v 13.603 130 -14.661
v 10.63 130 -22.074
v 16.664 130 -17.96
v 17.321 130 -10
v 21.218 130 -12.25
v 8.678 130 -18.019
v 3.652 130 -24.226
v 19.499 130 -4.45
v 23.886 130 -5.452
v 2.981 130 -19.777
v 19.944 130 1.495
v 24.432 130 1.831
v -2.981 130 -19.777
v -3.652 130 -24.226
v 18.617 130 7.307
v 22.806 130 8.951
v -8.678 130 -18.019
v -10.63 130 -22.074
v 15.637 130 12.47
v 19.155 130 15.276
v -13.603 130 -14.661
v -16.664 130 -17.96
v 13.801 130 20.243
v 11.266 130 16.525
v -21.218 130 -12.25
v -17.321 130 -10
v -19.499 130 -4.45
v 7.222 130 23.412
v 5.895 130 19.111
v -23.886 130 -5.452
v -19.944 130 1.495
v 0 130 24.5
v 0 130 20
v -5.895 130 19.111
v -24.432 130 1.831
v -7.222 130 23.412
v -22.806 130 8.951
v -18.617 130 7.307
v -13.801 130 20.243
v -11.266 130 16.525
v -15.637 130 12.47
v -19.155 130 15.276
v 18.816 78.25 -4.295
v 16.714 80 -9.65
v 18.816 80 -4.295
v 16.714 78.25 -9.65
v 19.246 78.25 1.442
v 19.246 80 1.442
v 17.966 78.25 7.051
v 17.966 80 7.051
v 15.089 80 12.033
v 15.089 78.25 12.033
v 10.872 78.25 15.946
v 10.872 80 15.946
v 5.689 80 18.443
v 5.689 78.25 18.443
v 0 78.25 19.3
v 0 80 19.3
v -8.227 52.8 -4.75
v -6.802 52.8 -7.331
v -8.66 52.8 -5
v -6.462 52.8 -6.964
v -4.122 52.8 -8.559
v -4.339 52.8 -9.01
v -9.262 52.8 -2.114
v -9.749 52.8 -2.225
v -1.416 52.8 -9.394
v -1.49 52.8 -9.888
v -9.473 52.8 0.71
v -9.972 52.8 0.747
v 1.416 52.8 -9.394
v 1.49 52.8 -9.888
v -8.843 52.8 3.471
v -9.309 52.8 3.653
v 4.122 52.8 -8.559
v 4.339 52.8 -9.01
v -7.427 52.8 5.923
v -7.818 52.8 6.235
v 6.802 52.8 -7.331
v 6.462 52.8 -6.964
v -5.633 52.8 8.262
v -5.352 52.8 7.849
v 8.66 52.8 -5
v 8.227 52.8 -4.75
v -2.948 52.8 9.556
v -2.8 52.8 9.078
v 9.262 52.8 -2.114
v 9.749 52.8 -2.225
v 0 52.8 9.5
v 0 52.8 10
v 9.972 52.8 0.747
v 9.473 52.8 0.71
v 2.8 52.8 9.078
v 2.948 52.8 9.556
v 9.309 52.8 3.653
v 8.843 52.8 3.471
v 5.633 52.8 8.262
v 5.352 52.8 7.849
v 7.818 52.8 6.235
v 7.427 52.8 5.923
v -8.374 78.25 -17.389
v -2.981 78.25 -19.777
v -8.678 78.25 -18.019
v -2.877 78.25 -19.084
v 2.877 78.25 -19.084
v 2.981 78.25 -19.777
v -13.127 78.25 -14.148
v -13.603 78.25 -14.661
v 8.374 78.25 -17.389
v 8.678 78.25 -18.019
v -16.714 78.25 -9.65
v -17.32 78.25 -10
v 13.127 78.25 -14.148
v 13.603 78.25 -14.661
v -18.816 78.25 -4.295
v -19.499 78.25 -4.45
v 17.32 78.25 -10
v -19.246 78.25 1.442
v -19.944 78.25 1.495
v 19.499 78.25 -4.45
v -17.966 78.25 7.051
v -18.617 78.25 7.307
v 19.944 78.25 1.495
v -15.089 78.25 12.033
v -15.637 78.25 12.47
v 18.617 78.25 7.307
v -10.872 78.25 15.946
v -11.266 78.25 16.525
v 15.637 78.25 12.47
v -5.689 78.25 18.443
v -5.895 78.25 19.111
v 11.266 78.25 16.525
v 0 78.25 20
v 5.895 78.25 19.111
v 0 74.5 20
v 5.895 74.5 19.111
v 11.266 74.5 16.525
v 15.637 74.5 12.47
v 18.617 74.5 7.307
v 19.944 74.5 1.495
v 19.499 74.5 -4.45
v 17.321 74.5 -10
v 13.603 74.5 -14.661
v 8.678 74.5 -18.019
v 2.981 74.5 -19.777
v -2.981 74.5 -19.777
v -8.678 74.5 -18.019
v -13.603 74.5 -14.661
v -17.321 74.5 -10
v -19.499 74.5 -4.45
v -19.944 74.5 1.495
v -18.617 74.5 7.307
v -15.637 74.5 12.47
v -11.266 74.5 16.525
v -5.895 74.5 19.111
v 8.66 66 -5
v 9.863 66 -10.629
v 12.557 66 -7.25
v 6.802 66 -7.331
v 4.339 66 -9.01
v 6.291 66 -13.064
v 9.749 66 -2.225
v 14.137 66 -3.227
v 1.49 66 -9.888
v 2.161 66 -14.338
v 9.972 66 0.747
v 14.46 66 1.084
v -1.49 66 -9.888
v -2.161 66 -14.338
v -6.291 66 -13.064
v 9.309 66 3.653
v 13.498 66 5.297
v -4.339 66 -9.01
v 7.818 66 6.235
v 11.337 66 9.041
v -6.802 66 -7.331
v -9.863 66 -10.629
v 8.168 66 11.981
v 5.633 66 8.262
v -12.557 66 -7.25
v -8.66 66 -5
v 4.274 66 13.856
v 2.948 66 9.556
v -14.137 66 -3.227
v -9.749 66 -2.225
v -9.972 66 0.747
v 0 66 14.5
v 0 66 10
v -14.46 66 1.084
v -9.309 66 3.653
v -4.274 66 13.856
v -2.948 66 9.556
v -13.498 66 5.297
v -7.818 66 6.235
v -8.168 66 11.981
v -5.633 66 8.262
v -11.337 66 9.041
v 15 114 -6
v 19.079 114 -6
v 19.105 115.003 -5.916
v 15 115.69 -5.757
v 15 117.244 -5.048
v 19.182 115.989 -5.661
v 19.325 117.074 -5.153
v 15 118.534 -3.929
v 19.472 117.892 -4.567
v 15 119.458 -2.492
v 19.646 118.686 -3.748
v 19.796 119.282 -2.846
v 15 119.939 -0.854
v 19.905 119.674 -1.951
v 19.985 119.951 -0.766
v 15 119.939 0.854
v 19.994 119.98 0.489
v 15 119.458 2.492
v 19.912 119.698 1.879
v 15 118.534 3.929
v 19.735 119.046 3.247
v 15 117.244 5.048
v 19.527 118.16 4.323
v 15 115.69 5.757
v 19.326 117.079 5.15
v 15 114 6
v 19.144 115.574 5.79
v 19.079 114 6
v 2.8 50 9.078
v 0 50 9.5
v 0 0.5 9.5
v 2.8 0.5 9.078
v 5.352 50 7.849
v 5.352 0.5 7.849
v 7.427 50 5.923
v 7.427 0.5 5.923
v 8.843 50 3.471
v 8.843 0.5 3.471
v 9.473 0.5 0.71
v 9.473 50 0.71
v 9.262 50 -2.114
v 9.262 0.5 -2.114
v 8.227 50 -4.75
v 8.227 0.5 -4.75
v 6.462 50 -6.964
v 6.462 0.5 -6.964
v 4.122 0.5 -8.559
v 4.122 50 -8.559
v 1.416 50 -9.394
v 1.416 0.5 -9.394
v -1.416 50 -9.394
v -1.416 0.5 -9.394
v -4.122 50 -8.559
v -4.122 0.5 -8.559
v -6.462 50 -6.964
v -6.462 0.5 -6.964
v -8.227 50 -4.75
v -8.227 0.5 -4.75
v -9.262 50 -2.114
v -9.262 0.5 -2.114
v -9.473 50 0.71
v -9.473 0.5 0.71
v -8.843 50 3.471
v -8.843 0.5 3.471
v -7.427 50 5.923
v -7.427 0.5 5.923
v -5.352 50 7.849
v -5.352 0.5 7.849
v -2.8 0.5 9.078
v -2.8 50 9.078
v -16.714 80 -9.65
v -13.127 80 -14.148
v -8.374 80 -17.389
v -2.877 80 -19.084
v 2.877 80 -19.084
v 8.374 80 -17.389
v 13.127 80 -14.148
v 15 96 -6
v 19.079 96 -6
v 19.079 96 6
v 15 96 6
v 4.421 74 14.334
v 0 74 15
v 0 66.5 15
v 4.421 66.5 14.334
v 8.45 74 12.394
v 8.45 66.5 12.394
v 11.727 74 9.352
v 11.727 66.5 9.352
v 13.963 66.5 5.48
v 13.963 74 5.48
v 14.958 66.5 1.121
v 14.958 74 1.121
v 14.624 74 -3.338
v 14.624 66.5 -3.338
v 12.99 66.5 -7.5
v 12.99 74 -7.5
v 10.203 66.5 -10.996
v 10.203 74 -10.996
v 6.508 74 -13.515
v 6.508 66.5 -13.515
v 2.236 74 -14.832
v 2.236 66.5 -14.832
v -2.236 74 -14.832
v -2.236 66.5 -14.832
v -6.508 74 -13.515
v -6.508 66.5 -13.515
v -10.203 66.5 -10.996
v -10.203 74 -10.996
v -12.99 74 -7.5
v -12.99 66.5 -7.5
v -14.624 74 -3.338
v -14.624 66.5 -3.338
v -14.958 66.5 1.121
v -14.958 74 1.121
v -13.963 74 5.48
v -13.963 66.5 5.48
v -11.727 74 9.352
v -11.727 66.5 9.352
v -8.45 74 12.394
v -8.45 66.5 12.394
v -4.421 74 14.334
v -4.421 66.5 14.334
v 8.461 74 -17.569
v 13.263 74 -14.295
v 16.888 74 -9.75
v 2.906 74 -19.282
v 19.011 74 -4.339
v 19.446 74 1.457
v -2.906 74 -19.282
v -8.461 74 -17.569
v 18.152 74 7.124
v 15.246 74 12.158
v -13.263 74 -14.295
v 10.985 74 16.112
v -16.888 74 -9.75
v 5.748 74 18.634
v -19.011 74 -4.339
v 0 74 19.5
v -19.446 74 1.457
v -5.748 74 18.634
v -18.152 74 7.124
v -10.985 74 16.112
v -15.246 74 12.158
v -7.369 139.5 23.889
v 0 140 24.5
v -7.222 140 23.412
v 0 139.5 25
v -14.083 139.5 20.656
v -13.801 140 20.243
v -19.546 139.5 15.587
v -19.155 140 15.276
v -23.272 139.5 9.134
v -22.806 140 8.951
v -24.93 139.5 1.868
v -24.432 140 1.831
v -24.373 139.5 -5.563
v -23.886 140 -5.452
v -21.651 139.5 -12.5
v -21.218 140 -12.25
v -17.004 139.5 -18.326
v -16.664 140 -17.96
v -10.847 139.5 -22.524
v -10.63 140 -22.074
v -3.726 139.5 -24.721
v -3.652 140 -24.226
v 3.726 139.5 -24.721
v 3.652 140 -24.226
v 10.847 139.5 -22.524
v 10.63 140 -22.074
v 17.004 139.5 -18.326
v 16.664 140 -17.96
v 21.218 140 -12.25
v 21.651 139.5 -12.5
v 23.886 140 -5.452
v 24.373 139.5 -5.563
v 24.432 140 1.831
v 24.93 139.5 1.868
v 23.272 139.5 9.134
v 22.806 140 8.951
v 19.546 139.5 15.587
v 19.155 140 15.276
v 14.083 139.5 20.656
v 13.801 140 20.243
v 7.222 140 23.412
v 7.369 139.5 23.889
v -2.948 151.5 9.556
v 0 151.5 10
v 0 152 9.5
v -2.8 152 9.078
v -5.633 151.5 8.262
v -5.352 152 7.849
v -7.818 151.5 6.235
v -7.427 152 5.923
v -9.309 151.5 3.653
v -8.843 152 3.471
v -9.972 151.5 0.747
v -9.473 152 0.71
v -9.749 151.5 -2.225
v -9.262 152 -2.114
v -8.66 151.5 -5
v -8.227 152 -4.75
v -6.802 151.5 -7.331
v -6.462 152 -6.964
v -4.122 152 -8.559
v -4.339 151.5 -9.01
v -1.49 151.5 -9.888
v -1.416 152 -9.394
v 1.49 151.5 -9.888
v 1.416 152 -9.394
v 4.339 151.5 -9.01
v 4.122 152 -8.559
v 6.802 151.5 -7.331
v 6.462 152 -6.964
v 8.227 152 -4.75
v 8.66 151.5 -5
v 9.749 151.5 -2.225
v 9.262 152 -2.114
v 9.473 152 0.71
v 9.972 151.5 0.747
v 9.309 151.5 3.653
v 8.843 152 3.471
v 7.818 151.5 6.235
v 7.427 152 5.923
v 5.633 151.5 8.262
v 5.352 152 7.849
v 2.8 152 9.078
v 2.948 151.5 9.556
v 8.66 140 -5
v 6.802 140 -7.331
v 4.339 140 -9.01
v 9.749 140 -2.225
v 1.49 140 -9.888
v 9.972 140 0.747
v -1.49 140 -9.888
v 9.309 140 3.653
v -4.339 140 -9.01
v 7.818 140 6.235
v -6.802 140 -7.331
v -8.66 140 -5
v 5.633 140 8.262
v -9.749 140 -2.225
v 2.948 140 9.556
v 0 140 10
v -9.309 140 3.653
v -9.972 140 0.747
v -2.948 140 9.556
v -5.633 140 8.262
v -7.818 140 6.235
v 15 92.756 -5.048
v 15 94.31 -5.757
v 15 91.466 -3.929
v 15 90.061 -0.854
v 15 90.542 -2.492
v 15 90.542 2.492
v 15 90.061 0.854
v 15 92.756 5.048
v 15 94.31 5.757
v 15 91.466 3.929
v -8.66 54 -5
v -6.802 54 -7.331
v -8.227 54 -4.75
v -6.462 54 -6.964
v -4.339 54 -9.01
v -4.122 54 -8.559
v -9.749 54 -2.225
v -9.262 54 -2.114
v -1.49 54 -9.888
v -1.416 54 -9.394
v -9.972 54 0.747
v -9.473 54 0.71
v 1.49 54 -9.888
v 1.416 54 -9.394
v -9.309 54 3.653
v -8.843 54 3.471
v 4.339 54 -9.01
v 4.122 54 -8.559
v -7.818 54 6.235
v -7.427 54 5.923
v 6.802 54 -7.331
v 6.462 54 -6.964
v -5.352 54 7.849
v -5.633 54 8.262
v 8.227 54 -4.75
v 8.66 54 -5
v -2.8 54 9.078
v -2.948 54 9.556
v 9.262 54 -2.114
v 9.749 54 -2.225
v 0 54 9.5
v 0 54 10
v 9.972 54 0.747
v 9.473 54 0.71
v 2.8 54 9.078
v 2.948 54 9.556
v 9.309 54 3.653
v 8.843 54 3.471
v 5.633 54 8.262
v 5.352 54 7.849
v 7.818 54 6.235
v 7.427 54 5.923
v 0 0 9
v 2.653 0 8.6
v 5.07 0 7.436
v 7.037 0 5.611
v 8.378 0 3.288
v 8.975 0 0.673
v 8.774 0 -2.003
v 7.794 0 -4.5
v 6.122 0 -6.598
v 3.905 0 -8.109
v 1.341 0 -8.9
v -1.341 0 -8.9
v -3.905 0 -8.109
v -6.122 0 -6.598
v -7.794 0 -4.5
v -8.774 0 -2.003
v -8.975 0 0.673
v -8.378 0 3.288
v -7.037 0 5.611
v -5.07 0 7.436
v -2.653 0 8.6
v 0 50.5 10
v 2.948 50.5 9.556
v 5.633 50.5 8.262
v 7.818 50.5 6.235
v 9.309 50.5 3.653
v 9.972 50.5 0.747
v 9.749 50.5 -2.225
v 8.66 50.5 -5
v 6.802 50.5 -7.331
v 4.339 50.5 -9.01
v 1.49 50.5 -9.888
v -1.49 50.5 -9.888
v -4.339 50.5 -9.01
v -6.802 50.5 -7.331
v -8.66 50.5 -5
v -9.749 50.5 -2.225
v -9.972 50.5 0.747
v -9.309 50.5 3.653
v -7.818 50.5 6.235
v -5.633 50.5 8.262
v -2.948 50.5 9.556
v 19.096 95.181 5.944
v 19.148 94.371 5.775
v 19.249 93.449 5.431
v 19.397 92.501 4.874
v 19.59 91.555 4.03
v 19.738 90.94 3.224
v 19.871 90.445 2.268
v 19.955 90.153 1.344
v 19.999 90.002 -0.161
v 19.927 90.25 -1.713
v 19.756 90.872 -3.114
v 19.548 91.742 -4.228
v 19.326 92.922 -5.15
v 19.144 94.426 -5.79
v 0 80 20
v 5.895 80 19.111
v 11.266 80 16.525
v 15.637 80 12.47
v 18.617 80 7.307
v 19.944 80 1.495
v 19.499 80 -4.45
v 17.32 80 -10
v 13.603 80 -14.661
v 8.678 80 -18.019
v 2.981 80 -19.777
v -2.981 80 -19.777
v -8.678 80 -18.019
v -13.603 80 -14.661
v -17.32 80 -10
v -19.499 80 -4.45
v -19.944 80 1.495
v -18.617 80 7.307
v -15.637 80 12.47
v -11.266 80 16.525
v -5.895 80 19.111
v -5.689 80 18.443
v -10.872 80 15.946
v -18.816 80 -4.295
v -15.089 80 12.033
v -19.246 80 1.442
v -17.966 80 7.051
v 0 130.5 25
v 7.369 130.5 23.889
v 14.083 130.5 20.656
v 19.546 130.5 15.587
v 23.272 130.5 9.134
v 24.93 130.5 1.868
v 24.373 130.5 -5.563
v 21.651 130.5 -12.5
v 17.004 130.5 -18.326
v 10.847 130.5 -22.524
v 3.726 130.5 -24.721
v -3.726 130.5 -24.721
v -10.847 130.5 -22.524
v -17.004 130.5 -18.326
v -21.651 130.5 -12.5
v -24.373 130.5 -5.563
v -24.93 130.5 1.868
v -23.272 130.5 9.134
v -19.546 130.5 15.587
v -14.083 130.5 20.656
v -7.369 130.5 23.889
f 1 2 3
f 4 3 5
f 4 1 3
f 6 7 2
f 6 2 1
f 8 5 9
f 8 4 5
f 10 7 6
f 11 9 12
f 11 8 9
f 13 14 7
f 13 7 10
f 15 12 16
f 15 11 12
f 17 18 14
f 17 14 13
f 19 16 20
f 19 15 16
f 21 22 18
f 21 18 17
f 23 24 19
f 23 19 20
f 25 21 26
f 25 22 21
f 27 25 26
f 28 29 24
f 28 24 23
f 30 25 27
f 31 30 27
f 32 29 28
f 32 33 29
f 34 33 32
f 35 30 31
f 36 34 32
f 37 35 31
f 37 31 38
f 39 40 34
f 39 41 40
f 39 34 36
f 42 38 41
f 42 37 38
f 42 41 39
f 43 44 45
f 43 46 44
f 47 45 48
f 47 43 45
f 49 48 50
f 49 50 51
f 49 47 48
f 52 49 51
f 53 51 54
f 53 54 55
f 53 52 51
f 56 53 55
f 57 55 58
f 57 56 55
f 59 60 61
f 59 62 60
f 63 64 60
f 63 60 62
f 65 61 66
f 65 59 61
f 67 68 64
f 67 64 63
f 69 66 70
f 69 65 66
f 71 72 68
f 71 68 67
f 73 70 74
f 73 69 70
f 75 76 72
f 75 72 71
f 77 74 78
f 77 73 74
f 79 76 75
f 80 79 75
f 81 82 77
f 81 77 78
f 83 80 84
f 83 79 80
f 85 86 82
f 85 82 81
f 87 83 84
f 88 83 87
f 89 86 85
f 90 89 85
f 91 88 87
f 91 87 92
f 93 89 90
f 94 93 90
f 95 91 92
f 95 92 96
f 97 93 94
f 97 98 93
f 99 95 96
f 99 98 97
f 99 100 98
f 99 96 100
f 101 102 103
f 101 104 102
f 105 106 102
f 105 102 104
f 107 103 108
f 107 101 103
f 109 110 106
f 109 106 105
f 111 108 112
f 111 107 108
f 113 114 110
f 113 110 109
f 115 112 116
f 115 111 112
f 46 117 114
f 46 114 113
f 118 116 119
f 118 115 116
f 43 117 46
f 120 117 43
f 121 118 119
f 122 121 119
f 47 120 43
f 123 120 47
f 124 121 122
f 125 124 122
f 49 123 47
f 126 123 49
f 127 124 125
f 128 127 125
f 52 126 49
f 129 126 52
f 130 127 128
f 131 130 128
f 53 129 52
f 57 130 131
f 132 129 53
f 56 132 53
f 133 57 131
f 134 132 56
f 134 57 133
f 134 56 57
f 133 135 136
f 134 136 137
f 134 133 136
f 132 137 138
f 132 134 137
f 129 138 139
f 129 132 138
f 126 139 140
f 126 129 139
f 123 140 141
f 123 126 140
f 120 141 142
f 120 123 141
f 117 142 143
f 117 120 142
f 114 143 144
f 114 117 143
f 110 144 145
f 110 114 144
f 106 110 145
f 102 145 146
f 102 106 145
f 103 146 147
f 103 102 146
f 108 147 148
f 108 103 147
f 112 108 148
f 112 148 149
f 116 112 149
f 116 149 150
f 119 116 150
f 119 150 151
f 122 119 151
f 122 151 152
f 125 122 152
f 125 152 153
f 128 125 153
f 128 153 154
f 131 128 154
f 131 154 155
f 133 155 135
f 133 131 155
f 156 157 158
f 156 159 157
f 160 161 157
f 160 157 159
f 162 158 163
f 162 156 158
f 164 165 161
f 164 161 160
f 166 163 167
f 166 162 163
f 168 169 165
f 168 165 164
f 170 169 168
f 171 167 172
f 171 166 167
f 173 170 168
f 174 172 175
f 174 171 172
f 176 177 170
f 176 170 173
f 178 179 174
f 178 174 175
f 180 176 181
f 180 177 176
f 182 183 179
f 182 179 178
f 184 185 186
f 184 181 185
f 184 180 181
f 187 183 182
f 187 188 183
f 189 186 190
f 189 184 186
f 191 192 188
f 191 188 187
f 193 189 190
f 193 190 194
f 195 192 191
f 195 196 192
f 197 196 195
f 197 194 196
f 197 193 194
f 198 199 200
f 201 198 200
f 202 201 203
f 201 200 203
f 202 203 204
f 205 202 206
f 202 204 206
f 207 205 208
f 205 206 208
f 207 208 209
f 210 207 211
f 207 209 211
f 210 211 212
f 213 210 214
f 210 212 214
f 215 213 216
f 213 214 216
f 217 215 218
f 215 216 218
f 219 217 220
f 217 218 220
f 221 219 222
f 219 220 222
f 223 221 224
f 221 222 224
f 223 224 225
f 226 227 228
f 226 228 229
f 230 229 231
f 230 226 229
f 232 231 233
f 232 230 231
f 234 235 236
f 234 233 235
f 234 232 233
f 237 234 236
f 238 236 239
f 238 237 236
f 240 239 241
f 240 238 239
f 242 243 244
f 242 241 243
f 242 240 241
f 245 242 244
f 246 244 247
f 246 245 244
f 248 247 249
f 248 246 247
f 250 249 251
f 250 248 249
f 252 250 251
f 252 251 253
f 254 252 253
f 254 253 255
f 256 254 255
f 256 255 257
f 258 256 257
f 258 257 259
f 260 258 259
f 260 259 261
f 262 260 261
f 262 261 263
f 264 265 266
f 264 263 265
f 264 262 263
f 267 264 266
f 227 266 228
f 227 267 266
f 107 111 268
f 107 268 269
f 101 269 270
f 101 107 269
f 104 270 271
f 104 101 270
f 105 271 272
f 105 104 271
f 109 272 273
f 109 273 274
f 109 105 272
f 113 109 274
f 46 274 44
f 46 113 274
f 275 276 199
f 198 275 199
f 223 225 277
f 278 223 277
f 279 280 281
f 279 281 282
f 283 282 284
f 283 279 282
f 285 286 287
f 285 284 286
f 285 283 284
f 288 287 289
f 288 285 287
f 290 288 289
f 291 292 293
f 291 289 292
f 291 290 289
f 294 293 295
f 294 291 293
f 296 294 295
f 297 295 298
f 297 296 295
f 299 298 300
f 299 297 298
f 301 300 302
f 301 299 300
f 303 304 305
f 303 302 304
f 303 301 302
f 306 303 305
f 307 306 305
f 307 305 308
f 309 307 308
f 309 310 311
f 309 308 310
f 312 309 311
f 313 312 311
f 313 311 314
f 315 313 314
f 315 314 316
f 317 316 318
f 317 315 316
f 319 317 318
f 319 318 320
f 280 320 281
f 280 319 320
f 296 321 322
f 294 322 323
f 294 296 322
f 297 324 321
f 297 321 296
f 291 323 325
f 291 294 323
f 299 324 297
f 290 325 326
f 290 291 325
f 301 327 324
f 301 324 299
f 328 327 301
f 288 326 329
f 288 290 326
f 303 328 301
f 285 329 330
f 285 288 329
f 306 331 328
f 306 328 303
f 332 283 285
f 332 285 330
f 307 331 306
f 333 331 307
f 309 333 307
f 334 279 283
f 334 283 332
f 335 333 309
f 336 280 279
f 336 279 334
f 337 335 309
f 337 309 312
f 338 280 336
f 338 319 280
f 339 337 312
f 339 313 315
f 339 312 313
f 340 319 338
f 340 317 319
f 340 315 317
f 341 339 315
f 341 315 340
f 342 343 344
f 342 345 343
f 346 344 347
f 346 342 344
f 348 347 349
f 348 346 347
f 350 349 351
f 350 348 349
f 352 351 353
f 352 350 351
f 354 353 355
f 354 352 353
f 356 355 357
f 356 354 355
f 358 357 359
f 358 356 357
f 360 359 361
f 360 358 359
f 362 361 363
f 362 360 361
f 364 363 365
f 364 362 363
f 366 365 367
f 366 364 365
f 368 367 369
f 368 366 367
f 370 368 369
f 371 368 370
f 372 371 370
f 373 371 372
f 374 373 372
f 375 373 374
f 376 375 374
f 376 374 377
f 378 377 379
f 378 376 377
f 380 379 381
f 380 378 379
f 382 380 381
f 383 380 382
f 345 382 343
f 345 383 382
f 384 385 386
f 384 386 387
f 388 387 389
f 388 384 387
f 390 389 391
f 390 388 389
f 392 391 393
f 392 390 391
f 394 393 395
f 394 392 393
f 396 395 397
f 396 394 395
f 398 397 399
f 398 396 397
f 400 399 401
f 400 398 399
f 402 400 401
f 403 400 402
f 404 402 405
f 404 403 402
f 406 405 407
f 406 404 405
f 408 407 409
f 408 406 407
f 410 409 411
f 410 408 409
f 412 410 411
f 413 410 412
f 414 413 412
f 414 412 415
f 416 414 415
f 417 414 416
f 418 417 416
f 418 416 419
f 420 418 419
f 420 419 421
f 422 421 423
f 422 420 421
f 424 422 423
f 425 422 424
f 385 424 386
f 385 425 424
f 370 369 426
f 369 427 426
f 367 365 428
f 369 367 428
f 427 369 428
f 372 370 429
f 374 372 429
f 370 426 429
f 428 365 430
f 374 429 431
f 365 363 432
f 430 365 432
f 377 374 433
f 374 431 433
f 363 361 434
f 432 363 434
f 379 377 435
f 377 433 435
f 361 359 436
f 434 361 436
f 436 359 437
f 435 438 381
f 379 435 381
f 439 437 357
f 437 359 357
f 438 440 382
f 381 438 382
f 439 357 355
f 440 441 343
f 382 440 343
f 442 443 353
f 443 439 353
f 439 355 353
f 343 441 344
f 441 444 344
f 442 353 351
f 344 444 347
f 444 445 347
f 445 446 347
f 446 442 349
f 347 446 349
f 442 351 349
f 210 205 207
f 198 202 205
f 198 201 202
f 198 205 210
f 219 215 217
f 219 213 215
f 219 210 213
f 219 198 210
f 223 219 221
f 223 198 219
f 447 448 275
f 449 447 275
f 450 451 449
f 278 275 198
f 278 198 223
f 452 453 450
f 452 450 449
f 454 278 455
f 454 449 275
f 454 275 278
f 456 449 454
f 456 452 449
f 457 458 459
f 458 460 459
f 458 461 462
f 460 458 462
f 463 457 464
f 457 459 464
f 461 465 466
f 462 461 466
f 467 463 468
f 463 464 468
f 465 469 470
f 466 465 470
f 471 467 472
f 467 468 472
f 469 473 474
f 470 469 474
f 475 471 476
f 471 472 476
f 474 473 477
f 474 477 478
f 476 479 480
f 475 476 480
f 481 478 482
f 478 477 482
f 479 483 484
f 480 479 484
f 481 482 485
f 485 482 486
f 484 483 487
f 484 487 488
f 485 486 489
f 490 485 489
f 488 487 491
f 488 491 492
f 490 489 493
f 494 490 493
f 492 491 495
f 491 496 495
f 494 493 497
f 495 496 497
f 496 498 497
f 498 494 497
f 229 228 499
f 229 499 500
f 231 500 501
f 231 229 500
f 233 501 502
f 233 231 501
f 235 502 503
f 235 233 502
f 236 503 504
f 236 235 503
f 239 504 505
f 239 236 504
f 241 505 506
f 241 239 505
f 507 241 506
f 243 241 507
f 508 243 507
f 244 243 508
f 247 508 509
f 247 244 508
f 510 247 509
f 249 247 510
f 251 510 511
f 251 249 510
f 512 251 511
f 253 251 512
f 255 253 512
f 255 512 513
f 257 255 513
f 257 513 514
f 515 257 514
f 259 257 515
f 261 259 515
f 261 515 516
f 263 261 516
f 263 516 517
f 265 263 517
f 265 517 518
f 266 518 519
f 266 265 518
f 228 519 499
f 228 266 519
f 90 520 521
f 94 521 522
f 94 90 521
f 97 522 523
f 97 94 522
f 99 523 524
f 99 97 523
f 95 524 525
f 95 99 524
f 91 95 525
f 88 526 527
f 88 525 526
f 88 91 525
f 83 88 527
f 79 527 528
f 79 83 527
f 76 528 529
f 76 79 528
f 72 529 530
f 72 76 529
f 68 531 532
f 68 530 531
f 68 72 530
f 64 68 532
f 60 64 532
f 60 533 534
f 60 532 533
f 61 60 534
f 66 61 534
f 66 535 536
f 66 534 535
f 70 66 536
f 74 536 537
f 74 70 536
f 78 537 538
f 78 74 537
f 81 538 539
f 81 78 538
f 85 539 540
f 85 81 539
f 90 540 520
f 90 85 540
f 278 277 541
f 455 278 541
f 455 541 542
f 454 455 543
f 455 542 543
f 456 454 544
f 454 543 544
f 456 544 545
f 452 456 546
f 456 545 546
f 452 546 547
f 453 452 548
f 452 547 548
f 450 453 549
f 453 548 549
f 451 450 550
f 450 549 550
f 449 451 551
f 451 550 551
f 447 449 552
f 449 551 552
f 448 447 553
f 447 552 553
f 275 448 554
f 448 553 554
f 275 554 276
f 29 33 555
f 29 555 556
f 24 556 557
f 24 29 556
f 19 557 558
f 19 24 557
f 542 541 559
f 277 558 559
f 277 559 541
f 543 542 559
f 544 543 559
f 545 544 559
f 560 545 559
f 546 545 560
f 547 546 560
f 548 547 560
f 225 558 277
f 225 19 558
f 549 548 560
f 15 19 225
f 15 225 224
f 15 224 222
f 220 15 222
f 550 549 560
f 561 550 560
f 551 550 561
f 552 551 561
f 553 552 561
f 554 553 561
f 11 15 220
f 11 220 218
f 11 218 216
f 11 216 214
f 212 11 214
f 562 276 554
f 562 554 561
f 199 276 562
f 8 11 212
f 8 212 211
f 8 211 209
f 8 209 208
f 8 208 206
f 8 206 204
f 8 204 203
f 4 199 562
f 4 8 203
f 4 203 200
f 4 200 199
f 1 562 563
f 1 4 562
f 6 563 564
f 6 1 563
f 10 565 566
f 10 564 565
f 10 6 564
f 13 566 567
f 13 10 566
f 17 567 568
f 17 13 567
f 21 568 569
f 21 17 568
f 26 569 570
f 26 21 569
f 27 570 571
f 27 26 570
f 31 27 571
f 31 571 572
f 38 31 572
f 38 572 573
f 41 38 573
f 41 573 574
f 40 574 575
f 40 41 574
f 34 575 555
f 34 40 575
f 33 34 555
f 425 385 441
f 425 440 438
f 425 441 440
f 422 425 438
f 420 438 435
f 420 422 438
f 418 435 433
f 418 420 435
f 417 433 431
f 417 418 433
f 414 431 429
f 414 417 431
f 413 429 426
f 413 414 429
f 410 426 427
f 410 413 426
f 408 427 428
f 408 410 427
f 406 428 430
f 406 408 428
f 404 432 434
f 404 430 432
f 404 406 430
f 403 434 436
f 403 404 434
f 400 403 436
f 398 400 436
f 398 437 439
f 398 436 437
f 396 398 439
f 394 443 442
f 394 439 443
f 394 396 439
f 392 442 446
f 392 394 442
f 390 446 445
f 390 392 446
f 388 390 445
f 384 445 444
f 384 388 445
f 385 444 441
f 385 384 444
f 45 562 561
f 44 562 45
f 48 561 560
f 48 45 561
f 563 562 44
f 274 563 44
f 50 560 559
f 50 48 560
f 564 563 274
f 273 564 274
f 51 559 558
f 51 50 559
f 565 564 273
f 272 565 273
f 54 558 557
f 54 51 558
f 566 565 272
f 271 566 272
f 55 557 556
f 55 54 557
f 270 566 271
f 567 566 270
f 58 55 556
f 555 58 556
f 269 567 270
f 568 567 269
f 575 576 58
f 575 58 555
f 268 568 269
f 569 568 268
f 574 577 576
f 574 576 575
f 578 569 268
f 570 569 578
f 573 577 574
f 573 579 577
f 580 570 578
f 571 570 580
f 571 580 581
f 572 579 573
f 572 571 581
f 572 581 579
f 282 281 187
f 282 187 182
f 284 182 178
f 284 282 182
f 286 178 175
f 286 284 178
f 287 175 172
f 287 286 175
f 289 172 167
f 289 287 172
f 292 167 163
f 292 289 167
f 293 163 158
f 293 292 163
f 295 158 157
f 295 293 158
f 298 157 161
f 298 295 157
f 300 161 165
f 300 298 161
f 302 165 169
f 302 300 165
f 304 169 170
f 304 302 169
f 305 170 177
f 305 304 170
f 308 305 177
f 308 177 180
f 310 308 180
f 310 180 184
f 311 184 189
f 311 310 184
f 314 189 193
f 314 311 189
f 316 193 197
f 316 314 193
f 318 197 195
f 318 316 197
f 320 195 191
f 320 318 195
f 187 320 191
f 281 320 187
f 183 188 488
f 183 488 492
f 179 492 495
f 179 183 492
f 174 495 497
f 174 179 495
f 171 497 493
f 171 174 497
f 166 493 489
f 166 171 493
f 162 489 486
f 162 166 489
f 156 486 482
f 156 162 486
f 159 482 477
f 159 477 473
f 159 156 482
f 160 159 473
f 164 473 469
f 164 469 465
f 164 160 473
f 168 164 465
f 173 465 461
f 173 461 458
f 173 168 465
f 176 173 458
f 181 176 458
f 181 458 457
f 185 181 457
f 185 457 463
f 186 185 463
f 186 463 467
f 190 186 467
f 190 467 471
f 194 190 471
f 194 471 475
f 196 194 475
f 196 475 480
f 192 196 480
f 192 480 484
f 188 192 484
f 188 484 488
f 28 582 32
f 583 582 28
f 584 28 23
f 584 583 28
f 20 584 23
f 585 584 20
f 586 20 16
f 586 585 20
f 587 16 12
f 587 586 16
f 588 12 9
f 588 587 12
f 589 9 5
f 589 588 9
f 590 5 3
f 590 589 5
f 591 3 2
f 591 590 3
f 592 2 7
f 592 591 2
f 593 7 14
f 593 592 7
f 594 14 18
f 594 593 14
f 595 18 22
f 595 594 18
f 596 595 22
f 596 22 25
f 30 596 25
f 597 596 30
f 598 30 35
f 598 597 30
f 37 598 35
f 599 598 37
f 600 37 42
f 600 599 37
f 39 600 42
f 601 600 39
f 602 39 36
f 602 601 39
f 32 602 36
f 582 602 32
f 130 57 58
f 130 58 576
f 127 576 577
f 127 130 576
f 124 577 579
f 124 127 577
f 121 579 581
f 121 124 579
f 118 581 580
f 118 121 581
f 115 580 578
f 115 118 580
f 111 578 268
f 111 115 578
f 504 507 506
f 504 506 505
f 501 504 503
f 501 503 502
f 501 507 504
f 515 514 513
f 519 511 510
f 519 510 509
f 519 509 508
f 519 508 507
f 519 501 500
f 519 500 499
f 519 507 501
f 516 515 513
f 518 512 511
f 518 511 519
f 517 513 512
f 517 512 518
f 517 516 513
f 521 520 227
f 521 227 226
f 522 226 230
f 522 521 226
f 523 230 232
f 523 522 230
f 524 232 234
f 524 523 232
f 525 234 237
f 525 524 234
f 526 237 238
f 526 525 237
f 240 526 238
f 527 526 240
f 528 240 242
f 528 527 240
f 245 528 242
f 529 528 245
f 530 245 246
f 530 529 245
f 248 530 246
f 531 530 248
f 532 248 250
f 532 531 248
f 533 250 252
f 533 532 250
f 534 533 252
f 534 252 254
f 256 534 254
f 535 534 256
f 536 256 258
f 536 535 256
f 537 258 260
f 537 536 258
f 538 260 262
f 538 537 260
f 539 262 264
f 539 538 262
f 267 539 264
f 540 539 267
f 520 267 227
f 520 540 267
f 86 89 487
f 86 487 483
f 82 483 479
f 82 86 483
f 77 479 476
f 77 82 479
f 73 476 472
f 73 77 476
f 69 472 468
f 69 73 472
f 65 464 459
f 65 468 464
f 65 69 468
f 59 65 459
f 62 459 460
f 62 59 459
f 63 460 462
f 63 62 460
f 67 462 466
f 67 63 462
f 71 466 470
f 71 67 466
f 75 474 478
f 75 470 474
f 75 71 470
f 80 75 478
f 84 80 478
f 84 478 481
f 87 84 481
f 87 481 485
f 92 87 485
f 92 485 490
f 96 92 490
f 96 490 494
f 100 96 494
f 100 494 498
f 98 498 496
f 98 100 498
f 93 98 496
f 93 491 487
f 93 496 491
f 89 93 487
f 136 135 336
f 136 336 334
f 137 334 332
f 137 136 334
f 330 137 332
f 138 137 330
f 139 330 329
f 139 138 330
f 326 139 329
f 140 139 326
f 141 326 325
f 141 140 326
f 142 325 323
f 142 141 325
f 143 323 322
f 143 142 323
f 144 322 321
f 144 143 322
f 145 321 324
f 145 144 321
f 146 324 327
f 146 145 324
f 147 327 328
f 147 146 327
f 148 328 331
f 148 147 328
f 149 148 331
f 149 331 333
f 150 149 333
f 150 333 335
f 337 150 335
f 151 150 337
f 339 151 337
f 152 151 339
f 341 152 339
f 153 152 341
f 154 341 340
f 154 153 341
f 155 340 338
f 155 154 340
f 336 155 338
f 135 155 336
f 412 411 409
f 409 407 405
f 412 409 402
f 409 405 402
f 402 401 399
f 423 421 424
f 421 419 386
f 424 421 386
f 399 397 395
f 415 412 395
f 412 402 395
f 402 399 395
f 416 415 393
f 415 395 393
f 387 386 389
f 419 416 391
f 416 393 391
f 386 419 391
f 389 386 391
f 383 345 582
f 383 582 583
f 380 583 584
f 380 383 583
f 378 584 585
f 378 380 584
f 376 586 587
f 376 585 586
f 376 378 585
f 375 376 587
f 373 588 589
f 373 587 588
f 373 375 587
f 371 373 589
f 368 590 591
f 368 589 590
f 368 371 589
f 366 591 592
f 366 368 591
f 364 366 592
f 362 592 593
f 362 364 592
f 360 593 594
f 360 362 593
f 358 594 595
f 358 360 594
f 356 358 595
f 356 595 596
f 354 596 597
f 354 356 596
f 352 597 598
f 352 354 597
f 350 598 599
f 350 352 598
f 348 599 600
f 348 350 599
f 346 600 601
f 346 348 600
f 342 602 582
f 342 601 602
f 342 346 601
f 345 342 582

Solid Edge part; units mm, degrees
sketch "Sketch1" plane through (0, 0, 0) normal (1, 0, 0) x (0, 1, 0)
  line L0 (0, 0) -> (0, 9.5)
  line L1 (0, 9.5) -> (50, 9.5)
  line L2 (50, 9.5) -> (50, 0)
  dimension "D1" = 9.5
  dimension "D2" = 9.5
  dimension "D3" = 50
revolve "RevolvedProtrusion1" add sketch "Sketch1" angle 360 about axis through (0, 77.0229, 0) along (0, -1, 0)
sketch "Sketch2" plane through (0, 0, 0) normal (1, 0, 0) x (0, 1, 0)
  line L0 (50, 0) -> (50, 10)
  line L1 (50, 10) -> (66, 10)
  line L2 (66, 10) -> (66, 0)
  dimension "D1" = 10
  dimension "D2" = 10
  dimension "D3" = 16
revolve "RevolvedProtrusion2" add sketch "Sketch2" angle 360 about axis through (0, 158.4797, 0) along (0, -1, 0)
sketch "Sketch3" plane through (0, 0, 0) normal (1, 0, 0) x (0, 1, 0)
  line L0 (66, 0) -> (66, 15)
  line L1 (66, 15) -> (74, 15)
  line L2 (74, 15) -> (74, 0)
  dimension "D1" = 15
  dimension "D2" = 15
  dimension "D3" = 8
revolve "RevolvedProtrusion3" add sketch "Sketch3" angle 360 about axis through (0, 252.6527, 0) along (0, -1, 0)
sketch "Sketch4" plane through (0, 0, 0) normal (1, 0, 0) x (0, 1, 0)
  line L0 (74, 0) -> (74, 20)
  line L1 (74, 20) -> (130, 20)
  line L2 (130, 20) -> (130, 0)
  dimension "D1" = 56
  dimension "D2" = 20
  dimension "D3" = 20
revolve "RevolvedProtrusion4" add sketch "Sketch4" angle 360 about axis through (0, 365.6603, 0) along (0, -1, 0)
sketch "Sketch5" plane through (0, 0, 0) normal (1, 0, 0) x (0, 1, 0)
  line L0 (130, 0) -> (130, 25)
  line L1 (130, 25) -> (140, 25)
  line L2 (140, 25) -> (140, 0)
  dimension "D1" = 25
  dimension "D2" = 25
  dimension "D3" = 10
revolve "RevolvedProtrusion5" add sketch "Sketch5" angle 360 about axis through (0, 524.9007, 0) along (0, -1, 0)
sketch "Sketch6" plane through (0, 0, 0) normal (1, 0, 0) x (0, 1, 0)
  line L0 (140, 0) -> (140, 10)
  line L1 (140, 10) -> (152, 10)
  line L2 (152, 10) -> (152, 0)
  dimension "D1" = 10
  dimension "D2" = 10
  dimension "D3" = 12
revolve "RevolvedProtrusion6" add sketch "Sketch6" angle 360 about axis through (0, 724.416, 0) along (0, -1, 0)
revolve "RevolvedProtrusion7" [suppressed]
revolve "RevolvedProtrusion8" [suppressed]
revolve "RevolvedProtrusion9" [suppressed]
revolve "RevolvedProtrusion10" [suppressed]
revolve "RevolvedProtrusion11" [suppressed]
revolve "RevolvedProtrusion12" [suppressed]
revolve "RevolvedProtrusion13" [suppressed]
revolve "RevolvedProtrusion14" [suppressed]
revolve "RevolvedProtrusion15" [suppressed]
revolve "RevolvedProtrusion16" [suppressed]
revolve "RevolvedProtrusion17" [suppressed]
revolve "RevolvedProtrusion18" [suppressed]
revolve "RevolvedProtrusion19" [suppressed]
revolve "RevolvedProtrusion20" [suppressed]
revolve "RevolvedProtrusion21" [suppressed]
revolve "RevolvedProtrusion22" [suppressed]
revolve "RevolvedProtrusion23" [suppressed]
revolve "RevolvedProtrusion24" [suppressed]
revolve "RevolvedProtrusion25" [suppressed]
sketch "Sketch7" plane through (0, 0, 0) normal (1, 0, 0) x (0, 1, 0)
  line L0 (52.8, 9.5) -> (52.8, 10)
  line L1 (52.8, 10) -> (54, 10)
  line L2 (54, 10) -> (54, 9.5)
  line L3 (54, 9.5) -> (52.8, 9.5)
  dimension "D1" = 10
  dimension "D2" = 9.5
  dimension "D3" = 52.8
  dimension "D4" = 1.2
revolve "RevolvedCutout1" cut sketch "Sketch7" angle 360 about axis through (0, -77.2219, 0) along (0, 1, 0)
revolve "RevolvedCutout2" [suppressed]
revolve "RevolvedCutout3" [suppressed]
revolve "RevolvedCutout4" [suppressed]
sketch "Sketch8" plane through (20, 0, 0) normal (1, 0, 0) x (0, 1, 0)
  line L0 (96, -6) -> (114, -6)
  arc A0 (114, 6) -> (114, -6) centre (114, 0) cw
  line L1 (114, 6) -> (96, 6)
  arc A1 (96, 6) -> (96, -6) centre (96, 0) ccw
  dimension "D1" = 12
  dimension "D2" = 90
  dimension "D3" = 30
extrude "Cutout1" cut sketch "Sketch8" against normal blind 5
extrude "Cutout2" [suppressed]
extrude "Cutout3" [suppressed]
extrude "Cutout4" [suppressed]
extrude "Cutout5" [suppressed]
extrude "Cutout6" [suppressed]
extrude "Cutout7" [suppressed]
extrude "Cutout8" [suppressed]
extrude "Cutout9" [suppressed]
extrude "Cutout10" [suppressed]
extrude "Cutout11" [suppressed]
extrude "Cutout12" [suppressed]
chamfer "Chamfer1" distance 0.5 angle 45 7 edges at (-9.5, 0, 0) (-10, 50, 0) (-15, 66, 0) (-20, 74, 0) (-25, 130, 0) (-25, 140, 0) (-10, 152, 0)
sketch "Sketch9" plane through (0, 0, 0) normal (1, 0, 0) x (0, 1, 0)
  line L0 (80, 19.3) -> (78.25, 19.3)
  line L1 (78.25, 19.3) -> (78.25, 20)
  line L2 (78.25, 20) -> (80, 20)
  line L3 (80, 20) -> (80, 19.3)
  dimension "D1" = 20
  dimension "D2" = 0.7
  dimension "D3" = 1.75
  dimension "D4" = 4.25
sketch3d "WycięciePoKrzywej_1 path"
  arc A0 (0, 74.4999, 20) -> (-17.3205, 74.4999, -10) centre (0, 74.4999, 0)
  arc A1 (-17.3205, 74.4999, -10) -> (17.3205, 74.4999, -10) centre (0, 74.4999, 0)
  arc A2 (17.3205, 74.4999, -10) -> (0, 74.4999, 20) centre (0, 74.4999, 0)
sweep "WycięciePoKrzywej_1" cut profiles "Sketch9" path "WycięciePoKrzywej_1 path"
properties material "Steel"
